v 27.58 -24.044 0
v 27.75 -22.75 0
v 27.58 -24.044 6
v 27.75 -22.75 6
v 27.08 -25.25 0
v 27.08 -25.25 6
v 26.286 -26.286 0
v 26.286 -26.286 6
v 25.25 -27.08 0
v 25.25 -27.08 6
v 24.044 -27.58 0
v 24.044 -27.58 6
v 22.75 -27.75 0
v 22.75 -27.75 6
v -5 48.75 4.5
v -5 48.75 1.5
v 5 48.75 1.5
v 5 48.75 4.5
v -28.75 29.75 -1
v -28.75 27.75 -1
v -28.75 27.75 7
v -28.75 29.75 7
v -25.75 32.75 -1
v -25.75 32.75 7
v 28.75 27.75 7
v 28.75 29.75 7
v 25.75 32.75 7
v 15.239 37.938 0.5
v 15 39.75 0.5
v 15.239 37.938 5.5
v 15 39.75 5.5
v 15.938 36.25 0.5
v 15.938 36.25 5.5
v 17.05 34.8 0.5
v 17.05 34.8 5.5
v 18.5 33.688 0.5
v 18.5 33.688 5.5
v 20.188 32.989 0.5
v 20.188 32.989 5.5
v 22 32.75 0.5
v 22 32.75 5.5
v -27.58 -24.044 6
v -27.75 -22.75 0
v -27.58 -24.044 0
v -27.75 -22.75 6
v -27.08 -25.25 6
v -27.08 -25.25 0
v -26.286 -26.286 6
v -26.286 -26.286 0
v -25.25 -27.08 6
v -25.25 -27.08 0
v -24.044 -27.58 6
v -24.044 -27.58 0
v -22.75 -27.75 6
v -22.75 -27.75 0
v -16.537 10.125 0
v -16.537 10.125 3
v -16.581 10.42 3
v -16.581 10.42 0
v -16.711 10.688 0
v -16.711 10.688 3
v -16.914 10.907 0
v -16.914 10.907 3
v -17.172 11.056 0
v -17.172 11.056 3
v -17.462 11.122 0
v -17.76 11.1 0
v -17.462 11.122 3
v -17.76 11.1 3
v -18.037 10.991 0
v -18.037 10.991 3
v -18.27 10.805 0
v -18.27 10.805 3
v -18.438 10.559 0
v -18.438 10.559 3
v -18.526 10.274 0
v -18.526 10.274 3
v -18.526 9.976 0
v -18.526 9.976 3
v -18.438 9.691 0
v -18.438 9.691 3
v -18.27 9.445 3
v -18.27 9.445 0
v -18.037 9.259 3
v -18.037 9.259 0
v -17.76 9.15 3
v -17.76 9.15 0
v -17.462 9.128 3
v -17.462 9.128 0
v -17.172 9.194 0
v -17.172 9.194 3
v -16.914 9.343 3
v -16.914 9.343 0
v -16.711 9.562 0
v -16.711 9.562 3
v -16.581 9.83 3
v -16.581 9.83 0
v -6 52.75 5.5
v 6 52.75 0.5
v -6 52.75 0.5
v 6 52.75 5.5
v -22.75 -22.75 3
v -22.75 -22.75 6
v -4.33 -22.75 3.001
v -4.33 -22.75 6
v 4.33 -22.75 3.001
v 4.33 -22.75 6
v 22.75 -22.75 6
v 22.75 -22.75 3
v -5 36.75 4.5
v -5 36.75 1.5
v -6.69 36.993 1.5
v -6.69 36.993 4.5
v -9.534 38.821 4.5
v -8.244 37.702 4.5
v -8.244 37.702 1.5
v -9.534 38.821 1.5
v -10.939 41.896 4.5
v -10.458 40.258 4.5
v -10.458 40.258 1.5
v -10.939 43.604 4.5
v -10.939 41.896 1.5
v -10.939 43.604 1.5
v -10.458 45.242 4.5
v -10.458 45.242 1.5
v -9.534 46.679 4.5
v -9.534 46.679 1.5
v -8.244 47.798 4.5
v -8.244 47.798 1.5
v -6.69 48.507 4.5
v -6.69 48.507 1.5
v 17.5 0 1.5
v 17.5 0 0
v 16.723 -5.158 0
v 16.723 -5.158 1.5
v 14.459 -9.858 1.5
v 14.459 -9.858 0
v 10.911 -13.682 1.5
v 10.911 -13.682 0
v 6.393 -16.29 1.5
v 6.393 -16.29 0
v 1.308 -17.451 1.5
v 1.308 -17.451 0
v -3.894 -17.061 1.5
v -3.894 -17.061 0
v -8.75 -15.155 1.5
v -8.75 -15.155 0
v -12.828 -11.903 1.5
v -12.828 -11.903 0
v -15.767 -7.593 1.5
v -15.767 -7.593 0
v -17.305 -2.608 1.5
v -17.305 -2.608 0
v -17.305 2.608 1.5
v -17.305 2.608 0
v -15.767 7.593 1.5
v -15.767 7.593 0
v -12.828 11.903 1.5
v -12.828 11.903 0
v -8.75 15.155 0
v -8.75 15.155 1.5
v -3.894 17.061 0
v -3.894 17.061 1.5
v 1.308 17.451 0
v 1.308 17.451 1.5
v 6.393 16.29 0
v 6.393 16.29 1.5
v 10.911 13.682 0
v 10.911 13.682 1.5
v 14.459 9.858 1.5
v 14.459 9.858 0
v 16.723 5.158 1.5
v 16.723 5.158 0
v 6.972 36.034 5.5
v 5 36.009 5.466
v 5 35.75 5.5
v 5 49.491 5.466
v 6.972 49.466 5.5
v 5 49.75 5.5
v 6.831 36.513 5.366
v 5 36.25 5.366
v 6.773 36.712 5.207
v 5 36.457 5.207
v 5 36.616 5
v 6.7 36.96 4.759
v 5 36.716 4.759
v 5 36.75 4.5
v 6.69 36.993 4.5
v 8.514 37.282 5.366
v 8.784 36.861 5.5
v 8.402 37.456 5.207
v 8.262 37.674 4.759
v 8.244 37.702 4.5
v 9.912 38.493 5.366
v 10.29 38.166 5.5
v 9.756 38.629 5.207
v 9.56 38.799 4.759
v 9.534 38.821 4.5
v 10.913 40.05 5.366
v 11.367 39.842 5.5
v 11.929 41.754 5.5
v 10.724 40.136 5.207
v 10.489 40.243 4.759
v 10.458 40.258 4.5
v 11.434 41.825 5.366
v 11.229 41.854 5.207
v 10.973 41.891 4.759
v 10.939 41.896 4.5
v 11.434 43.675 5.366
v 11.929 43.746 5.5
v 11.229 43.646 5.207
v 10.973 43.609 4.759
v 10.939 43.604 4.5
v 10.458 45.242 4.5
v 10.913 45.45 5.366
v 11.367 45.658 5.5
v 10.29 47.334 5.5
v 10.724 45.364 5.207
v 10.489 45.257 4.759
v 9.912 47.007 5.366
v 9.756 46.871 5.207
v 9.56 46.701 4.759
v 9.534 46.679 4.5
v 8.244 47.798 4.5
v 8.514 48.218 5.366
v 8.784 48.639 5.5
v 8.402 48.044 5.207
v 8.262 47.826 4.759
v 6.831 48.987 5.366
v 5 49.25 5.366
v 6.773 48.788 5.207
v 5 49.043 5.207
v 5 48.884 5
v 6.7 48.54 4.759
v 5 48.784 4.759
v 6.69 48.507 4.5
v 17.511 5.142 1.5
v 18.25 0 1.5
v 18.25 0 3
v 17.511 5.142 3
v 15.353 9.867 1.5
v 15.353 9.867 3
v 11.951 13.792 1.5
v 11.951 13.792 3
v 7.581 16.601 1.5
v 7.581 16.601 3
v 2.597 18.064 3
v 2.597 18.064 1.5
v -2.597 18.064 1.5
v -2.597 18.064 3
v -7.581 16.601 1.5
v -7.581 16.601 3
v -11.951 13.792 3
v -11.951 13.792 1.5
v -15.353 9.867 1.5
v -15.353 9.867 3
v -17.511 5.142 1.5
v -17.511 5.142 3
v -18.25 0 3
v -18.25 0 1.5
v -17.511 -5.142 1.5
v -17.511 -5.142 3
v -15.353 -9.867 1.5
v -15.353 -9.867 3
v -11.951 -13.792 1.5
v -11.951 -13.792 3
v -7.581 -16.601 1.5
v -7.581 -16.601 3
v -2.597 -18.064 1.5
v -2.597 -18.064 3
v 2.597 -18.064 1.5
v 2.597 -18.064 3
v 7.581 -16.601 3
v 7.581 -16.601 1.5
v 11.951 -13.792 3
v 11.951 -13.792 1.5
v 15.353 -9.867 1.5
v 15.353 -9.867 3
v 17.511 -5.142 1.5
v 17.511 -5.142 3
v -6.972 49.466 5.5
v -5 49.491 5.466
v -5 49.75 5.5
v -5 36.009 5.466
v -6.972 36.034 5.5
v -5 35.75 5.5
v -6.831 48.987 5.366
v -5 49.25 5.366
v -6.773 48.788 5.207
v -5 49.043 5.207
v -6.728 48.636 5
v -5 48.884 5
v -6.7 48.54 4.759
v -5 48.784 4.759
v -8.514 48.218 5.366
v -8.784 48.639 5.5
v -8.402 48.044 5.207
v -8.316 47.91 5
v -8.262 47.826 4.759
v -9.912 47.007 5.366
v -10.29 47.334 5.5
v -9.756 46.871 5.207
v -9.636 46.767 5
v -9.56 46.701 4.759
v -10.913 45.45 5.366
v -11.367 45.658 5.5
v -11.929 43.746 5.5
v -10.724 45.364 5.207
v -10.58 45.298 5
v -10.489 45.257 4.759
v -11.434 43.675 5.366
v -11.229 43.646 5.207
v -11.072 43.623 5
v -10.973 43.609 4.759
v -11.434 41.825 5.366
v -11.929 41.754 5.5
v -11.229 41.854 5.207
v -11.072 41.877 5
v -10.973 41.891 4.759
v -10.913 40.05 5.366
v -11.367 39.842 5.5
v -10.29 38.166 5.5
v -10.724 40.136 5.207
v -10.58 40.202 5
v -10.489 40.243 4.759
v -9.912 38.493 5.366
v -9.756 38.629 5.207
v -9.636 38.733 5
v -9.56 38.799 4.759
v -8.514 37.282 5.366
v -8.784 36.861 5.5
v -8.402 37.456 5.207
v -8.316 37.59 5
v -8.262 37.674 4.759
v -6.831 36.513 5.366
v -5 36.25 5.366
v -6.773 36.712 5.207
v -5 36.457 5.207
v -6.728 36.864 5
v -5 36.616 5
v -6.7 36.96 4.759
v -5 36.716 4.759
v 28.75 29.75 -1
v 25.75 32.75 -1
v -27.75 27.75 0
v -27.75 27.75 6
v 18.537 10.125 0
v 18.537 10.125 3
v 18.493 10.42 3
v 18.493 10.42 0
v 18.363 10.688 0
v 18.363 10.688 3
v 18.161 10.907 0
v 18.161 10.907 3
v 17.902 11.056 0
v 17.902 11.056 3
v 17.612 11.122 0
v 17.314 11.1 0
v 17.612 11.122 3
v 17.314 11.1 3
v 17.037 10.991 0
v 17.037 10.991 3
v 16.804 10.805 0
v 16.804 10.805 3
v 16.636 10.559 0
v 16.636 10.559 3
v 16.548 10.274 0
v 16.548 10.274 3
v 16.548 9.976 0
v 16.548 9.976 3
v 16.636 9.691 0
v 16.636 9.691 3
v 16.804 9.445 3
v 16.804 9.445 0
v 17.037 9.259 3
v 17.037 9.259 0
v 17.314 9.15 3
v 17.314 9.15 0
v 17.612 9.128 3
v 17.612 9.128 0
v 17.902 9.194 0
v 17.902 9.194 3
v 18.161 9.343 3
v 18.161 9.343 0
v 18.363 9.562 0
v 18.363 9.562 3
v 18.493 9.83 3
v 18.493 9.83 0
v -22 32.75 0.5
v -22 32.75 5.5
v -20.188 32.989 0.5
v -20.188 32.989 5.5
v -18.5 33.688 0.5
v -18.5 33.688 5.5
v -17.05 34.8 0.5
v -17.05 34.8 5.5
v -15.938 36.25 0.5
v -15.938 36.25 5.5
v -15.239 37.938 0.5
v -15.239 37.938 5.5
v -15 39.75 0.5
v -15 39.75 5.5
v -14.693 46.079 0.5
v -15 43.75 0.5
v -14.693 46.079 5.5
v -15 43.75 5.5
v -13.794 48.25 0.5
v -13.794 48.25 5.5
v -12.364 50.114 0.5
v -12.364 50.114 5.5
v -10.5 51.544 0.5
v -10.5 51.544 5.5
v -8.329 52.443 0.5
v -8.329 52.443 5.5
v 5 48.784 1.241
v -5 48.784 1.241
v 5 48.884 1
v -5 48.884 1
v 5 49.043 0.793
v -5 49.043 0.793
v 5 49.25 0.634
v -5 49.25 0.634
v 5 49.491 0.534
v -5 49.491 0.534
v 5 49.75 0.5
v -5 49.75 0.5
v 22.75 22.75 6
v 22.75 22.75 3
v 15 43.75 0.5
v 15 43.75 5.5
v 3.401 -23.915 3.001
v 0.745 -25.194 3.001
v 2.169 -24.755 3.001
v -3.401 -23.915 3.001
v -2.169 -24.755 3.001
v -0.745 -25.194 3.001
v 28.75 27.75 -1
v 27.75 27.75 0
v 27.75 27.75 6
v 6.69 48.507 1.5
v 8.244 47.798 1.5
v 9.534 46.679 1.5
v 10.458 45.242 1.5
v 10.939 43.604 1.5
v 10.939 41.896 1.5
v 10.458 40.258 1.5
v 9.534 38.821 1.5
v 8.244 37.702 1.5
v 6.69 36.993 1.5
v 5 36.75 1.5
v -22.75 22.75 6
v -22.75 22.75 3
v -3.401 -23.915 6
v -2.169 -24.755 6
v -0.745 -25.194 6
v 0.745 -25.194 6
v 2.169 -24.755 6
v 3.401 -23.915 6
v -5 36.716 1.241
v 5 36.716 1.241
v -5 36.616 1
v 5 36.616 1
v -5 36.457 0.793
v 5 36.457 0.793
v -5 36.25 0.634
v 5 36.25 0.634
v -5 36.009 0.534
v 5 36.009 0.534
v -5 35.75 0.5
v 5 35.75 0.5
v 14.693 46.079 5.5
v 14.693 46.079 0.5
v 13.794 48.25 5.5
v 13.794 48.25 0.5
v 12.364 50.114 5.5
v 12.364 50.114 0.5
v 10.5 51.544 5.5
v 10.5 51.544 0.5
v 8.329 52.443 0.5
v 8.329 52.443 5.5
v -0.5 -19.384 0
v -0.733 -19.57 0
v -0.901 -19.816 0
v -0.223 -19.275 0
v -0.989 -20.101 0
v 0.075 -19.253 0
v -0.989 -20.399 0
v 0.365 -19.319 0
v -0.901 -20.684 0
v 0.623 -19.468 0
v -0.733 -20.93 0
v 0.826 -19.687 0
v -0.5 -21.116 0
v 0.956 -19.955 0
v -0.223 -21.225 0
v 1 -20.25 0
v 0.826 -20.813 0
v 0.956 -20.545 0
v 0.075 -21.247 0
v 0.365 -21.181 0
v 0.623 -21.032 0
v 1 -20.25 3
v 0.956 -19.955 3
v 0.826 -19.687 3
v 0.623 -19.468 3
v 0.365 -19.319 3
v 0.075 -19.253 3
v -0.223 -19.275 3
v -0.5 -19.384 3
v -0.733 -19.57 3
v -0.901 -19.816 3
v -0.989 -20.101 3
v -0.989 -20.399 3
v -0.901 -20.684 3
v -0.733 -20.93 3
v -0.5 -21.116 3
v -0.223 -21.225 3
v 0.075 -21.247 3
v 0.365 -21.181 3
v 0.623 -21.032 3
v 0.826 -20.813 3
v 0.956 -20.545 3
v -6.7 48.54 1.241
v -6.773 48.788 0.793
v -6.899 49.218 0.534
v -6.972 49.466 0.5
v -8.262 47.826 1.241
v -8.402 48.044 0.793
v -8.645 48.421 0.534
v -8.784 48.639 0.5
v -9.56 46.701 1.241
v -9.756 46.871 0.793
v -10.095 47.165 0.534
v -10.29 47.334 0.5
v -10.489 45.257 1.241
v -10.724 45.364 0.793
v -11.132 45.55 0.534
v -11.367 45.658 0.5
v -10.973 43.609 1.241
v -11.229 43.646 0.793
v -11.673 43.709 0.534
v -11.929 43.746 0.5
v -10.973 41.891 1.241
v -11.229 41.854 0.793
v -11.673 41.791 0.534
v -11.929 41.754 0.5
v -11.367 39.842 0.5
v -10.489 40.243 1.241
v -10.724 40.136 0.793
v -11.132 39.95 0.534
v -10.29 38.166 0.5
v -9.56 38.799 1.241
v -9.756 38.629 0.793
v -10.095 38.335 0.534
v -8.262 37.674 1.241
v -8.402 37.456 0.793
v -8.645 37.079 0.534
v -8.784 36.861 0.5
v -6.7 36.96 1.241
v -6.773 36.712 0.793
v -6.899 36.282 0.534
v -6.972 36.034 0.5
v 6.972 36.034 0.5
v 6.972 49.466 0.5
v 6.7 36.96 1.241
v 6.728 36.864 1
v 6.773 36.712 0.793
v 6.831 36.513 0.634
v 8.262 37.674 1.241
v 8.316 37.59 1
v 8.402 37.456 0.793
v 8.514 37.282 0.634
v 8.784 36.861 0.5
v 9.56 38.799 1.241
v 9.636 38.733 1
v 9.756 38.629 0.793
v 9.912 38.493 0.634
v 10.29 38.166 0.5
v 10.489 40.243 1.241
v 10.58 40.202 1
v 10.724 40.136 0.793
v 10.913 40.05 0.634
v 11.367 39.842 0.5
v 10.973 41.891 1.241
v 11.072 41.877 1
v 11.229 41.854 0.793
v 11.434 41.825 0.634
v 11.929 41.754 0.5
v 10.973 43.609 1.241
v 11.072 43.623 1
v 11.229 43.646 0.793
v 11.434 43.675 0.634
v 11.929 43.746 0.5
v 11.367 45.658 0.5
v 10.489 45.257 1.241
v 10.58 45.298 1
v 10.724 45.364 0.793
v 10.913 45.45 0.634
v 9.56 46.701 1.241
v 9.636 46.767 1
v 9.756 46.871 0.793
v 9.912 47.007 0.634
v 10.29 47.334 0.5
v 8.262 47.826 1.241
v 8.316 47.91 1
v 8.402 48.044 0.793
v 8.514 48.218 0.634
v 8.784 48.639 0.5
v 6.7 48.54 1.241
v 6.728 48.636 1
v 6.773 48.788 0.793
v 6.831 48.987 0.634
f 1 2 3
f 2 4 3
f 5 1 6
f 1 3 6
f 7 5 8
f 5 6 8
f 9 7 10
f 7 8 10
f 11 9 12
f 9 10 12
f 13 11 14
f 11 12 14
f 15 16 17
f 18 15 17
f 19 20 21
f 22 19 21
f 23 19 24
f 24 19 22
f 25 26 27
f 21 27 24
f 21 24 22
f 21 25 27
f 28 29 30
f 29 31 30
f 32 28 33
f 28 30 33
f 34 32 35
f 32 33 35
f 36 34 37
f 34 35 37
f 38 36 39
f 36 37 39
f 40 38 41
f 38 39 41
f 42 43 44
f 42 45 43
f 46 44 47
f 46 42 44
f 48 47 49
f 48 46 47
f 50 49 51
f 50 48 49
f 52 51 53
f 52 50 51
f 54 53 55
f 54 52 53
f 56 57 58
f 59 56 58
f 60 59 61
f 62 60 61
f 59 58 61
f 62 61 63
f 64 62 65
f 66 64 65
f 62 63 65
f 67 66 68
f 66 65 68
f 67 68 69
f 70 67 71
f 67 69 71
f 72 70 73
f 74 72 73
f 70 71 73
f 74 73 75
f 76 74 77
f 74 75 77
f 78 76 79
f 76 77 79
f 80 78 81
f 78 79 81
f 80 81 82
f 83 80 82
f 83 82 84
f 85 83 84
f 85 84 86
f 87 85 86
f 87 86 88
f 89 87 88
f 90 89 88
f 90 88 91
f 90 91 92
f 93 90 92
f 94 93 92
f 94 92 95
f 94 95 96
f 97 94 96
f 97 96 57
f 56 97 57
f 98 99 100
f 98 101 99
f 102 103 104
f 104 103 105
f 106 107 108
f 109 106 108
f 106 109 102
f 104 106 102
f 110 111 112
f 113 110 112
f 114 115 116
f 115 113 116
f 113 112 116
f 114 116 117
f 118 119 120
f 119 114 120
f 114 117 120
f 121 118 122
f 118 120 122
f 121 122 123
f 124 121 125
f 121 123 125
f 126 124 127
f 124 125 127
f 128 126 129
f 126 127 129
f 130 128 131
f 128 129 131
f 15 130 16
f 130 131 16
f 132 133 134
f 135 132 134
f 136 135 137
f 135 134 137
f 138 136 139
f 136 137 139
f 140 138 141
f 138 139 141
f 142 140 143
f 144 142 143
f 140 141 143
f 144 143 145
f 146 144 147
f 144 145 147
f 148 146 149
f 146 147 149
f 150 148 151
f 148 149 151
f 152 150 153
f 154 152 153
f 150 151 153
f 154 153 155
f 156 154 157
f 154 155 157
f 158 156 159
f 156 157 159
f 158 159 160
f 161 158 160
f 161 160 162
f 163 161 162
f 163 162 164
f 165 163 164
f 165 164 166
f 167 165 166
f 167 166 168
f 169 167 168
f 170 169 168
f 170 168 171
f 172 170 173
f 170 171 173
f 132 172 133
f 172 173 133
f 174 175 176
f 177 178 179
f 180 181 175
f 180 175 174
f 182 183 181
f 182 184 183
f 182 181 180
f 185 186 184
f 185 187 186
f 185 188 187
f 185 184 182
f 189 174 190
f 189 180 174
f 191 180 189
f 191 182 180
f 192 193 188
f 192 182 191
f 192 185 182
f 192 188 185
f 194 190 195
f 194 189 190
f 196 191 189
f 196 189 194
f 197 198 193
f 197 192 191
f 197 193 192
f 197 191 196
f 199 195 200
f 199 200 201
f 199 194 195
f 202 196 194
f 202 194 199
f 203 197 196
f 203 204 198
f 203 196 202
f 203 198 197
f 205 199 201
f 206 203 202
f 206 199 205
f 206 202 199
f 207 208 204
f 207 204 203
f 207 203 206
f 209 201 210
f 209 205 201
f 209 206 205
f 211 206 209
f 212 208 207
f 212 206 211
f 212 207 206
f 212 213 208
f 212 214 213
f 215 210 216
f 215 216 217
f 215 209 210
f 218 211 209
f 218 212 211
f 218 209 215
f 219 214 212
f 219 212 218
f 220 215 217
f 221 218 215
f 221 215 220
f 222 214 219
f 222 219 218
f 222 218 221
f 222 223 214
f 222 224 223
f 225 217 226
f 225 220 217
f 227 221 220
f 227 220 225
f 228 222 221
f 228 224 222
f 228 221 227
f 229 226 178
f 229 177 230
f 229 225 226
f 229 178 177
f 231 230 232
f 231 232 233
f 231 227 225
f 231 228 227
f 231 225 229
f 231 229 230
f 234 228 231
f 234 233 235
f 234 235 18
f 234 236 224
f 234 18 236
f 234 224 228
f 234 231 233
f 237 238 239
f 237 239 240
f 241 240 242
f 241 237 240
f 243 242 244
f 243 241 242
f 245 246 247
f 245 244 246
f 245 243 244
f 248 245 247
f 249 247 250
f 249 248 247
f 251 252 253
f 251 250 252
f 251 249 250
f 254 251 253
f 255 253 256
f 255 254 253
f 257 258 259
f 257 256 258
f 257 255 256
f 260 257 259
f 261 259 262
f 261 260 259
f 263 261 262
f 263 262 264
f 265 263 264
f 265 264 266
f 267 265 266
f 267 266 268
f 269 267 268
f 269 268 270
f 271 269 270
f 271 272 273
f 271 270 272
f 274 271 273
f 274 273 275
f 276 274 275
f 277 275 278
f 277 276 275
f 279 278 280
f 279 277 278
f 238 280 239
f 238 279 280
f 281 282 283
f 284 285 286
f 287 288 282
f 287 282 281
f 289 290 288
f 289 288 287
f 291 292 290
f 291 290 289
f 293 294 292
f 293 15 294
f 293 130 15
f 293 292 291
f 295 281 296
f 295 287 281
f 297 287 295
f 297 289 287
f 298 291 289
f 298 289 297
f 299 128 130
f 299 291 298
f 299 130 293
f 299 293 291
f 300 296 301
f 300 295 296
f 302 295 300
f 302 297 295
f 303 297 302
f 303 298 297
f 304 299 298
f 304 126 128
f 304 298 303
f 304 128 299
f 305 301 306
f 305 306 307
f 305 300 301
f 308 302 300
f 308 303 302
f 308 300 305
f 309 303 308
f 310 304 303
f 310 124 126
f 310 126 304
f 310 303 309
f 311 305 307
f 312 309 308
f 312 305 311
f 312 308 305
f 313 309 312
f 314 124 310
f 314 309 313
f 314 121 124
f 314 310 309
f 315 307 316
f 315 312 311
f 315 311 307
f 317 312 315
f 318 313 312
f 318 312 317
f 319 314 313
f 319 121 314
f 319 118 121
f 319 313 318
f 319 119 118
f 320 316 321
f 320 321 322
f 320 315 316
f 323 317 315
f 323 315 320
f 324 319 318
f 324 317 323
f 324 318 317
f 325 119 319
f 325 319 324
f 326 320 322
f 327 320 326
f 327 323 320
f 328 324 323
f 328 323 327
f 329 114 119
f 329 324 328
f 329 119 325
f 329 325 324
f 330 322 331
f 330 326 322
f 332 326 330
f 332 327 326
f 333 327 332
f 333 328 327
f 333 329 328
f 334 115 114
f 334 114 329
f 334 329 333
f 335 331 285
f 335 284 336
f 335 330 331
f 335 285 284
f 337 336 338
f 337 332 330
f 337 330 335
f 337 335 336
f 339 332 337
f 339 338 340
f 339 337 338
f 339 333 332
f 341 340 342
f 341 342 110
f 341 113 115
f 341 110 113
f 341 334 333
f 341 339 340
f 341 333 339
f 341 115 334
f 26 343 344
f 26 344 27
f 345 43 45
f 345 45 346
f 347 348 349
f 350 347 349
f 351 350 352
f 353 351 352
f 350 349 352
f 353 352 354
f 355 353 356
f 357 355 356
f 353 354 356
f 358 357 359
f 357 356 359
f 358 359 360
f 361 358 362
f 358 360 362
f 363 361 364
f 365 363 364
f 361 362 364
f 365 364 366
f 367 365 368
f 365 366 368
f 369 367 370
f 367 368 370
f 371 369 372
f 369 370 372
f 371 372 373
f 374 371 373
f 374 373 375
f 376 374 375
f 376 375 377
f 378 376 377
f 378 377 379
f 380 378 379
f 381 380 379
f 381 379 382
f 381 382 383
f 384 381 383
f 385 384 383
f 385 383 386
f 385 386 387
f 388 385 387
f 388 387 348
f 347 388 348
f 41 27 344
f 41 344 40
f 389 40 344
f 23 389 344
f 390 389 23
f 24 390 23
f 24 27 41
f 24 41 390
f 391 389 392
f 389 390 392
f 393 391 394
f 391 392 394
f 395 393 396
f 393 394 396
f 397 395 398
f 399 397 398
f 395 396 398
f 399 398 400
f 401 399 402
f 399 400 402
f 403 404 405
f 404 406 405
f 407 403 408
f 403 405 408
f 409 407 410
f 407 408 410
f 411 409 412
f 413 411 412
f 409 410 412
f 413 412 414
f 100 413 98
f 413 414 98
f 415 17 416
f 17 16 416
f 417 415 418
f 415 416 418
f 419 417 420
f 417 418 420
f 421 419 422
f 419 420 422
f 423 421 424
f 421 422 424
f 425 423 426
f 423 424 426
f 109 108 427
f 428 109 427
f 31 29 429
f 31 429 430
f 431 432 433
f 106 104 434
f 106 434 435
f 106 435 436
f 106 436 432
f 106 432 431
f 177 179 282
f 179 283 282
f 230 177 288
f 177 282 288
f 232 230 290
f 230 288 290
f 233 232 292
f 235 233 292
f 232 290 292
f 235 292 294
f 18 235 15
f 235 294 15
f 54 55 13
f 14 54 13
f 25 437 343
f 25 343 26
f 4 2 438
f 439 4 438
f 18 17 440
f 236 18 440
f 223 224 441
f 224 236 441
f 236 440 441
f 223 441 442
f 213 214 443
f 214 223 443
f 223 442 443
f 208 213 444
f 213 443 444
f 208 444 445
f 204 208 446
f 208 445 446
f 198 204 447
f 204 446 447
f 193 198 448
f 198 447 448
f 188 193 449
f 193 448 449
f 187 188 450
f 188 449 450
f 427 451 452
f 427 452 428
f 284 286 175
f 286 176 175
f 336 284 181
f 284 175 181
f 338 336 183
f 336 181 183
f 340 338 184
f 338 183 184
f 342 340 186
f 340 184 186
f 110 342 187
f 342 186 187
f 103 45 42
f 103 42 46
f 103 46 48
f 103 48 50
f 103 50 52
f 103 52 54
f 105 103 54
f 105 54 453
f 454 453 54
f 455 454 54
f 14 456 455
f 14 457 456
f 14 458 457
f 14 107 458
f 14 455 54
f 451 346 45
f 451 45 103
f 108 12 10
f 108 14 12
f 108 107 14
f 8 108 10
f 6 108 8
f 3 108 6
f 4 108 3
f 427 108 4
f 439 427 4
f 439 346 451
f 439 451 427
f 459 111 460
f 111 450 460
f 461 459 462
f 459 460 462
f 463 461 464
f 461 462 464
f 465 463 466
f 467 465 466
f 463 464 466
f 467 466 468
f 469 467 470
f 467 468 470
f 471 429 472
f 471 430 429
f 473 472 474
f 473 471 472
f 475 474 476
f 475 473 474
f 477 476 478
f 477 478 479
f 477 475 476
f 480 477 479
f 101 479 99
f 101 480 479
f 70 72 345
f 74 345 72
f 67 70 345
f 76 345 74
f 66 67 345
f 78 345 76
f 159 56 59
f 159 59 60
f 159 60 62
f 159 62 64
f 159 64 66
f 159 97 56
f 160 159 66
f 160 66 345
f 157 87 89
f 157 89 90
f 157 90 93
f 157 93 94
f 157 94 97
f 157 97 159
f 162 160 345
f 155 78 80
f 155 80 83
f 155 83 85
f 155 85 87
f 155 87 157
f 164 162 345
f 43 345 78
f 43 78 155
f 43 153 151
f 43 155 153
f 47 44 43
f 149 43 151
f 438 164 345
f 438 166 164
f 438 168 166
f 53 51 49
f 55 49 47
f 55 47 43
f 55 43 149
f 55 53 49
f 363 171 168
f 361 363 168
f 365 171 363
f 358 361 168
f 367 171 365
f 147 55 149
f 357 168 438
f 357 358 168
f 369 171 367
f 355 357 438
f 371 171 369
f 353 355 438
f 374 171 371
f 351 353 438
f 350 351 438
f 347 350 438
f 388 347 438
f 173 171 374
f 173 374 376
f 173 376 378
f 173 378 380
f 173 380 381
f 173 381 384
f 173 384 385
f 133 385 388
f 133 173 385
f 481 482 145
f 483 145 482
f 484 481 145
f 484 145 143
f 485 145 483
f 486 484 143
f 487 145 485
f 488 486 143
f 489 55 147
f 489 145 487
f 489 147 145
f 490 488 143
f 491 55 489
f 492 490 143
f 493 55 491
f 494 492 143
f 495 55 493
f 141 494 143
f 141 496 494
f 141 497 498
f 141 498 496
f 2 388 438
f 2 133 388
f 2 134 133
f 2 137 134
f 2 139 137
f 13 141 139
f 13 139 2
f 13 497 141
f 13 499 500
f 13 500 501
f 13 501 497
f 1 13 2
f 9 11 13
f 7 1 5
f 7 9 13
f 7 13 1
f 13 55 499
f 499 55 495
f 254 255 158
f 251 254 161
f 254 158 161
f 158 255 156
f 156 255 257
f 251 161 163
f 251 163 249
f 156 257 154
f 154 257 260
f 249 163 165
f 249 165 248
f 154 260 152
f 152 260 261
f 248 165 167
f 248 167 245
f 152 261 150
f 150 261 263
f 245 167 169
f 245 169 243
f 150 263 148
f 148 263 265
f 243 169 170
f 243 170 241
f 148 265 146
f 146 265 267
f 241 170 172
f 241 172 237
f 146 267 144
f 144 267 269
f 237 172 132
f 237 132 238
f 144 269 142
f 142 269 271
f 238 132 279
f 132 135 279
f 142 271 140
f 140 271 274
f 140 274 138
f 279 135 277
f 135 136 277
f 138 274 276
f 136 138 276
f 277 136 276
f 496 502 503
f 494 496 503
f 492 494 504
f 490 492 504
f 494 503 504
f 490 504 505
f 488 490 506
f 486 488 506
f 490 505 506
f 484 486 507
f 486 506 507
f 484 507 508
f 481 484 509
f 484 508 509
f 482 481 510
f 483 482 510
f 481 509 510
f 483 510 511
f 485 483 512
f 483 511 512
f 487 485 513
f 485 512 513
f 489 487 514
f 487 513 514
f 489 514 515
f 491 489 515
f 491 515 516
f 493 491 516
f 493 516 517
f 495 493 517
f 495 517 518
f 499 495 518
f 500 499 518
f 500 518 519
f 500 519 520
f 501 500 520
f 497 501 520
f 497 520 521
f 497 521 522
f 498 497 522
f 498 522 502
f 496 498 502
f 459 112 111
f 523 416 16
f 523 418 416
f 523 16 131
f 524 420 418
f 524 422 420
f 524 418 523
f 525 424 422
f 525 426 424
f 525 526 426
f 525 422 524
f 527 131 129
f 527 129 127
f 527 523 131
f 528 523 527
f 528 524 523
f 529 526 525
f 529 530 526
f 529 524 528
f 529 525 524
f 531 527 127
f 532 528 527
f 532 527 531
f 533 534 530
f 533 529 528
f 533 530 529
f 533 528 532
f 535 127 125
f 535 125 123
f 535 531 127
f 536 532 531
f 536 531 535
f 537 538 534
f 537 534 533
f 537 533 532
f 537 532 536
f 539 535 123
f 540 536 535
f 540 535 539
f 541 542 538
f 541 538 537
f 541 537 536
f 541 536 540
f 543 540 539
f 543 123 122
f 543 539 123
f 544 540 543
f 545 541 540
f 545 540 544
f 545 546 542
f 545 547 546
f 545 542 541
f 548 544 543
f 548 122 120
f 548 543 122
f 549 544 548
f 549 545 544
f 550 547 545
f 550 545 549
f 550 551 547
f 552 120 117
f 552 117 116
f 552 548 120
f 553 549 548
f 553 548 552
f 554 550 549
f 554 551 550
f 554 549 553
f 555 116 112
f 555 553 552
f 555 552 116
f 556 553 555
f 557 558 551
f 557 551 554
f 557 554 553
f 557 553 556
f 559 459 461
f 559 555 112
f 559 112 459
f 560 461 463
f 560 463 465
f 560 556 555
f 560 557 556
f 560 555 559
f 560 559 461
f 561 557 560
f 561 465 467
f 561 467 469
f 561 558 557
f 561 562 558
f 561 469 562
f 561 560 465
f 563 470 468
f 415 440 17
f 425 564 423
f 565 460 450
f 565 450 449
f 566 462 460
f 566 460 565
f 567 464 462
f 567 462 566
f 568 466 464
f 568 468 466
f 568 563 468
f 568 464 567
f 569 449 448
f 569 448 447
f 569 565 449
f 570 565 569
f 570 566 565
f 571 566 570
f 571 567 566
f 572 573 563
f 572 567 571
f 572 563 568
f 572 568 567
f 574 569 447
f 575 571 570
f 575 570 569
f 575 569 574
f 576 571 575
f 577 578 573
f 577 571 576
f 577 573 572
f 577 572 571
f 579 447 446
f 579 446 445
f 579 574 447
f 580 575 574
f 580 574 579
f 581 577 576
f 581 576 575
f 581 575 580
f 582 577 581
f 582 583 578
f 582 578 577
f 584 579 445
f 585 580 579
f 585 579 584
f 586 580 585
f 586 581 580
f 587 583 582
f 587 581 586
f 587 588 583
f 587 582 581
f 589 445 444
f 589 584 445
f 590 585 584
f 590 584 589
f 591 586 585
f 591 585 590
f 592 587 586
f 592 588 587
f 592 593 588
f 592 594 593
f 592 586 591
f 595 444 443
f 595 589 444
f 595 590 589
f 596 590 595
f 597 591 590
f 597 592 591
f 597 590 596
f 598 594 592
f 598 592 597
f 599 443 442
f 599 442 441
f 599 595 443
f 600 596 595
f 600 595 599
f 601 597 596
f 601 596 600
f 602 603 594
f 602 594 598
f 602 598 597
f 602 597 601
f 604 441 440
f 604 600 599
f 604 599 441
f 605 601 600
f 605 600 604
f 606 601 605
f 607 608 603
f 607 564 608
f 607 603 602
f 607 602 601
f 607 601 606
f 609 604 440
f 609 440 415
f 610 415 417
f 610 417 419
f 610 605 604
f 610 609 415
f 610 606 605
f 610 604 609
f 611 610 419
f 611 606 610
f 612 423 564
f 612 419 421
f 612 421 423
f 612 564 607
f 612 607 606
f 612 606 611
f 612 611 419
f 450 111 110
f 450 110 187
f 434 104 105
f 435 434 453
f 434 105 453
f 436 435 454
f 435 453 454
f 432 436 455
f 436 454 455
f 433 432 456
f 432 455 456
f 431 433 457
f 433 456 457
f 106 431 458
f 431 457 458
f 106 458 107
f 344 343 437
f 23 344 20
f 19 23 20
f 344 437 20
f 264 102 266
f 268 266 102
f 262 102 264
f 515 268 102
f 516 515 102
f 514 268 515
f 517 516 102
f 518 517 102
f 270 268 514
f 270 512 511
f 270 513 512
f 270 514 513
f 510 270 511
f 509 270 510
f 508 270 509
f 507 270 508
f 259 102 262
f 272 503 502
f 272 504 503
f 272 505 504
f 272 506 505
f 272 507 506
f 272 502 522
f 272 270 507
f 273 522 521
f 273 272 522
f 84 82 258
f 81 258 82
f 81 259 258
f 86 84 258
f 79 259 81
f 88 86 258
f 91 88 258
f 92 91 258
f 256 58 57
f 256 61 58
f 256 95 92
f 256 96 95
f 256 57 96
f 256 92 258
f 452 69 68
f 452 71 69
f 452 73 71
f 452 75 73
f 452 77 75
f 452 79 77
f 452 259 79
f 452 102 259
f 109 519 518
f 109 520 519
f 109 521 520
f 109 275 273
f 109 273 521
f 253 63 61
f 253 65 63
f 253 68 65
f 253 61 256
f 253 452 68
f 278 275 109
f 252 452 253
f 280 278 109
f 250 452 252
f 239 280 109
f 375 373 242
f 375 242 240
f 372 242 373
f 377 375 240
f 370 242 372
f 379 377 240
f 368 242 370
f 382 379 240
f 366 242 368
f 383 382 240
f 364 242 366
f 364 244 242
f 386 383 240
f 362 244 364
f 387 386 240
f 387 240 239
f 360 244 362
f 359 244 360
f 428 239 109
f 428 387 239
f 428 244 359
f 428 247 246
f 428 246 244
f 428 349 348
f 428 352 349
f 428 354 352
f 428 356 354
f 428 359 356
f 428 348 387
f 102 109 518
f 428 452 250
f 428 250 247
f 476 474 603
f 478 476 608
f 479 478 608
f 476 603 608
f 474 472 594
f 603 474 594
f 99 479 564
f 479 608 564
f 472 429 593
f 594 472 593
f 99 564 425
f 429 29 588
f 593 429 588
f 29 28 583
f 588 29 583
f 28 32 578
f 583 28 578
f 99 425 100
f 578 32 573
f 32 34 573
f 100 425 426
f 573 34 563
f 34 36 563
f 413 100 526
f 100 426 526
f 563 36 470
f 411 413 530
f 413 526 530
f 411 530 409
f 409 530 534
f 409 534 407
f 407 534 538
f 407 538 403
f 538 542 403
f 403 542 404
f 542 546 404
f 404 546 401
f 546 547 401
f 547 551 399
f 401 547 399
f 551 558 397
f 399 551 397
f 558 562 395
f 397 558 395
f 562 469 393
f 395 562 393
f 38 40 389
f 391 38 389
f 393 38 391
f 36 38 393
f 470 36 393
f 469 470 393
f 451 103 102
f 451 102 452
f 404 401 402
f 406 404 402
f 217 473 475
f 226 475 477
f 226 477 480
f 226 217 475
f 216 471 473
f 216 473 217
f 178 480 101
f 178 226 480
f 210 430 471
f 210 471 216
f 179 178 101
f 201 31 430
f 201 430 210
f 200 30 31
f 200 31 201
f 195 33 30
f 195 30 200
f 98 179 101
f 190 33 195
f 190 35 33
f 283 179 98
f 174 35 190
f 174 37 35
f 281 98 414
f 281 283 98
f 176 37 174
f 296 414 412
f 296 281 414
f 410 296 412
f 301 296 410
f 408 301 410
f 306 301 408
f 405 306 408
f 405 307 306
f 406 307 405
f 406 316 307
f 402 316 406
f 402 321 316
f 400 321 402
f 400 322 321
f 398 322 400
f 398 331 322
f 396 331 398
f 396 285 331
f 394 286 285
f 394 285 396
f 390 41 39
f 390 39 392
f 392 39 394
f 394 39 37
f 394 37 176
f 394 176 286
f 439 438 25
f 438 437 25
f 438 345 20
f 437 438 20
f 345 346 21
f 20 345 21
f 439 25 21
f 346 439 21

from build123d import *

# Parameters (mm, degrees)
SKETCH_W        = 55.5
SKETCH_H        = 55.5
SKETCH_R        = 18.25
PAD_DEPTH       = 6
SKETCH001_W     = 57.5
SKETCH001_H     = 8
PAD001_DEPTH    = 5
SKETCH002_W     = 30
SKETCH002_H     = 5
PAD002_DEPTH    = 20
FILLET_R        = 5
POCKET_DEPTH    = 6
FILLET001_R     = 9
FILLET002_R     = 7
CHAMFER_SIZE    = 3
SKETCH004_R     = 18.25
SKETCH004_R_2   = 17.5
PAD003_DEPTH    = 1.5
SKETCH005_W     = 45.5
SKETCH005_H     = 45.5
POCKET001_DEPTH = 3
SKETCH006_R     = 1
POCKET002_DEPTH = 6
FILLET003_R     = 1
FILLET004_R     = 1
SKETCH007_R     = 5
POCKET003_DEPTH = 2.999


with BuildPart() as part:
    # Sketch → Pad (new body)
    with BuildSketch(Plane.XY):
        Rectangle(SKETCH_W, SKETCH_H)
        Circle(SKETCH_R, mode=Mode.SUBTRACT)
    extrude(amount=PAD_DEPTH)

    # Sketch001 → Pad001 (new body)
    with BuildSketch(Plane(origin=(0, 27.75, 0), x_dir=(-1, 0, 0), z_dir=(0, 1, 0))):
        with Locations((0, 3)):
            Rectangle(SKETCH001_W, SKETCH001_H)
    extrude(amount=PAD001_DEPTH)

    # Sketch002 → Pad002 (new body)
    with BuildSketch(Plane(origin=(0, 32.75, 0), x_dir=(-1, 0, 0), z_dir=(0, 1, 0))):
        with Locations((0, 3)):
            Rectangle(SKETCH002_W, SKETCH002_H)
    extrude(amount=PAD002_DEPTH)

    # Fillet
    fillet_edges = [part.edges().sort_by_distance(p)[0] for p in [
        (-27.75, -27.75, 3),
        (27.75, -27.75, 3),
    ]]
    fillet(fillet_edges, radius=FILLET_R)

    # Sketch003 → Pocket (cut)
    with BuildSketch(Plane(origin=(0, 0, 0.5), x_dir=(1, 0, 0), z_dir=(0, 0, -1))):
        with BuildLine():
            ThreePointArc((-5, -36.75), (-11, -42.75), (-5, -48.75))
            Line((-5, -48.75), (5, -48.75))
            ThreePointArc((5, -48.75), (11, -42.75), (5, -36.75))
            Line((-5, -36.75), (5, -36.75))
        make_face()
    extrude(amount=-POCKET_DEPTH, mode=Mode.SUBTRACT)

    # Fillet001
    fillet001_edges = [part.edges().sort_by_distance(p)[0] for p in [
        (15, 52.75, 3),
        (-15, 52.75, 3),
    ]]
    fillet(fillet001_edges, radius=FILLET001_R)

    # Fillet002
    fillet002_edges = [part.edges().sort_by_distance(p)[0] for p in [
        (15, 32.75, 3),
        (-15, 32.75, 3),
    ]]
    fillet(fillet002_edges, radius=FILLET002_R)

    # Chamfer
    chamfer_edges = [part.edges().sort_by_distance(p)[0] for p in [
        (-28.75, 32.75, 3),
        (28.75, 32.75, 3),
    ]]
    chamfer(chamfer_edges, length=CHAMFER_SIZE)

    # Sketch004 → Pad003 (new body)
    with BuildSketch(Plane(origin=(0, 0, 0), x_dir=(1, 0, 0), z_dir=(0, 0, -1))):
        Circle(SKETCH004_R)
        Circle(SKETCH004_R_2, mode=Mode.SUBTRACT)
    extrude(amount=-PAD003_DEPTH)

    # Sketch005 → Pocket001 (cut)
    with BuildSketch(Plane.XY.offset(6)):
        Rectangle(SKETCH005_W, SKETCH005_H)
    extrude(amount=-POCKET001_DEPTH, mode=Mode.SUBTRACT)

    # Sketch006 → Pocket002 (cut)
    with BuildSketch(Plane.XY.offset(3)):
        with Locations((-17.537014, 10.125)):
            Circle(SKETCH006_R)
        with Locations((17.537014, 10.125)):
            Circle(SKETCH006_R)
        with Locations((0, -20.25)):
            Circle(SKETCH006_R)
    extrude(amount=-POCKET002_DEPTH, mode=Mode.SUBTRACT)

    # Fillet003
    fillet003_edges = [part.edges().sort_by_distance(p)[0] for p in [
        (0, 48.75, 5.5),
    ]]
    fillet(fillet003_edges, radius=FILLET003_R)

    # Fillet004
    fillet004_edges = [part.edges().sort_by_distance(p)[0] for p in [
        (0, 36.75, 0.5),
    ]]
    fillet(fillet004_edges, radius=FILLET004_R)

    # Sketch007 → Pocket003 (cut)
    with BuildSketch(Plane.XY.offset(6)):
        with Locations((0, -20.25)):
            Circle(SKETCH007_R)
    extrude(amount=-POCKET003_DEPTH, mode=Mode.SUBTRACT)


solid = part.part
